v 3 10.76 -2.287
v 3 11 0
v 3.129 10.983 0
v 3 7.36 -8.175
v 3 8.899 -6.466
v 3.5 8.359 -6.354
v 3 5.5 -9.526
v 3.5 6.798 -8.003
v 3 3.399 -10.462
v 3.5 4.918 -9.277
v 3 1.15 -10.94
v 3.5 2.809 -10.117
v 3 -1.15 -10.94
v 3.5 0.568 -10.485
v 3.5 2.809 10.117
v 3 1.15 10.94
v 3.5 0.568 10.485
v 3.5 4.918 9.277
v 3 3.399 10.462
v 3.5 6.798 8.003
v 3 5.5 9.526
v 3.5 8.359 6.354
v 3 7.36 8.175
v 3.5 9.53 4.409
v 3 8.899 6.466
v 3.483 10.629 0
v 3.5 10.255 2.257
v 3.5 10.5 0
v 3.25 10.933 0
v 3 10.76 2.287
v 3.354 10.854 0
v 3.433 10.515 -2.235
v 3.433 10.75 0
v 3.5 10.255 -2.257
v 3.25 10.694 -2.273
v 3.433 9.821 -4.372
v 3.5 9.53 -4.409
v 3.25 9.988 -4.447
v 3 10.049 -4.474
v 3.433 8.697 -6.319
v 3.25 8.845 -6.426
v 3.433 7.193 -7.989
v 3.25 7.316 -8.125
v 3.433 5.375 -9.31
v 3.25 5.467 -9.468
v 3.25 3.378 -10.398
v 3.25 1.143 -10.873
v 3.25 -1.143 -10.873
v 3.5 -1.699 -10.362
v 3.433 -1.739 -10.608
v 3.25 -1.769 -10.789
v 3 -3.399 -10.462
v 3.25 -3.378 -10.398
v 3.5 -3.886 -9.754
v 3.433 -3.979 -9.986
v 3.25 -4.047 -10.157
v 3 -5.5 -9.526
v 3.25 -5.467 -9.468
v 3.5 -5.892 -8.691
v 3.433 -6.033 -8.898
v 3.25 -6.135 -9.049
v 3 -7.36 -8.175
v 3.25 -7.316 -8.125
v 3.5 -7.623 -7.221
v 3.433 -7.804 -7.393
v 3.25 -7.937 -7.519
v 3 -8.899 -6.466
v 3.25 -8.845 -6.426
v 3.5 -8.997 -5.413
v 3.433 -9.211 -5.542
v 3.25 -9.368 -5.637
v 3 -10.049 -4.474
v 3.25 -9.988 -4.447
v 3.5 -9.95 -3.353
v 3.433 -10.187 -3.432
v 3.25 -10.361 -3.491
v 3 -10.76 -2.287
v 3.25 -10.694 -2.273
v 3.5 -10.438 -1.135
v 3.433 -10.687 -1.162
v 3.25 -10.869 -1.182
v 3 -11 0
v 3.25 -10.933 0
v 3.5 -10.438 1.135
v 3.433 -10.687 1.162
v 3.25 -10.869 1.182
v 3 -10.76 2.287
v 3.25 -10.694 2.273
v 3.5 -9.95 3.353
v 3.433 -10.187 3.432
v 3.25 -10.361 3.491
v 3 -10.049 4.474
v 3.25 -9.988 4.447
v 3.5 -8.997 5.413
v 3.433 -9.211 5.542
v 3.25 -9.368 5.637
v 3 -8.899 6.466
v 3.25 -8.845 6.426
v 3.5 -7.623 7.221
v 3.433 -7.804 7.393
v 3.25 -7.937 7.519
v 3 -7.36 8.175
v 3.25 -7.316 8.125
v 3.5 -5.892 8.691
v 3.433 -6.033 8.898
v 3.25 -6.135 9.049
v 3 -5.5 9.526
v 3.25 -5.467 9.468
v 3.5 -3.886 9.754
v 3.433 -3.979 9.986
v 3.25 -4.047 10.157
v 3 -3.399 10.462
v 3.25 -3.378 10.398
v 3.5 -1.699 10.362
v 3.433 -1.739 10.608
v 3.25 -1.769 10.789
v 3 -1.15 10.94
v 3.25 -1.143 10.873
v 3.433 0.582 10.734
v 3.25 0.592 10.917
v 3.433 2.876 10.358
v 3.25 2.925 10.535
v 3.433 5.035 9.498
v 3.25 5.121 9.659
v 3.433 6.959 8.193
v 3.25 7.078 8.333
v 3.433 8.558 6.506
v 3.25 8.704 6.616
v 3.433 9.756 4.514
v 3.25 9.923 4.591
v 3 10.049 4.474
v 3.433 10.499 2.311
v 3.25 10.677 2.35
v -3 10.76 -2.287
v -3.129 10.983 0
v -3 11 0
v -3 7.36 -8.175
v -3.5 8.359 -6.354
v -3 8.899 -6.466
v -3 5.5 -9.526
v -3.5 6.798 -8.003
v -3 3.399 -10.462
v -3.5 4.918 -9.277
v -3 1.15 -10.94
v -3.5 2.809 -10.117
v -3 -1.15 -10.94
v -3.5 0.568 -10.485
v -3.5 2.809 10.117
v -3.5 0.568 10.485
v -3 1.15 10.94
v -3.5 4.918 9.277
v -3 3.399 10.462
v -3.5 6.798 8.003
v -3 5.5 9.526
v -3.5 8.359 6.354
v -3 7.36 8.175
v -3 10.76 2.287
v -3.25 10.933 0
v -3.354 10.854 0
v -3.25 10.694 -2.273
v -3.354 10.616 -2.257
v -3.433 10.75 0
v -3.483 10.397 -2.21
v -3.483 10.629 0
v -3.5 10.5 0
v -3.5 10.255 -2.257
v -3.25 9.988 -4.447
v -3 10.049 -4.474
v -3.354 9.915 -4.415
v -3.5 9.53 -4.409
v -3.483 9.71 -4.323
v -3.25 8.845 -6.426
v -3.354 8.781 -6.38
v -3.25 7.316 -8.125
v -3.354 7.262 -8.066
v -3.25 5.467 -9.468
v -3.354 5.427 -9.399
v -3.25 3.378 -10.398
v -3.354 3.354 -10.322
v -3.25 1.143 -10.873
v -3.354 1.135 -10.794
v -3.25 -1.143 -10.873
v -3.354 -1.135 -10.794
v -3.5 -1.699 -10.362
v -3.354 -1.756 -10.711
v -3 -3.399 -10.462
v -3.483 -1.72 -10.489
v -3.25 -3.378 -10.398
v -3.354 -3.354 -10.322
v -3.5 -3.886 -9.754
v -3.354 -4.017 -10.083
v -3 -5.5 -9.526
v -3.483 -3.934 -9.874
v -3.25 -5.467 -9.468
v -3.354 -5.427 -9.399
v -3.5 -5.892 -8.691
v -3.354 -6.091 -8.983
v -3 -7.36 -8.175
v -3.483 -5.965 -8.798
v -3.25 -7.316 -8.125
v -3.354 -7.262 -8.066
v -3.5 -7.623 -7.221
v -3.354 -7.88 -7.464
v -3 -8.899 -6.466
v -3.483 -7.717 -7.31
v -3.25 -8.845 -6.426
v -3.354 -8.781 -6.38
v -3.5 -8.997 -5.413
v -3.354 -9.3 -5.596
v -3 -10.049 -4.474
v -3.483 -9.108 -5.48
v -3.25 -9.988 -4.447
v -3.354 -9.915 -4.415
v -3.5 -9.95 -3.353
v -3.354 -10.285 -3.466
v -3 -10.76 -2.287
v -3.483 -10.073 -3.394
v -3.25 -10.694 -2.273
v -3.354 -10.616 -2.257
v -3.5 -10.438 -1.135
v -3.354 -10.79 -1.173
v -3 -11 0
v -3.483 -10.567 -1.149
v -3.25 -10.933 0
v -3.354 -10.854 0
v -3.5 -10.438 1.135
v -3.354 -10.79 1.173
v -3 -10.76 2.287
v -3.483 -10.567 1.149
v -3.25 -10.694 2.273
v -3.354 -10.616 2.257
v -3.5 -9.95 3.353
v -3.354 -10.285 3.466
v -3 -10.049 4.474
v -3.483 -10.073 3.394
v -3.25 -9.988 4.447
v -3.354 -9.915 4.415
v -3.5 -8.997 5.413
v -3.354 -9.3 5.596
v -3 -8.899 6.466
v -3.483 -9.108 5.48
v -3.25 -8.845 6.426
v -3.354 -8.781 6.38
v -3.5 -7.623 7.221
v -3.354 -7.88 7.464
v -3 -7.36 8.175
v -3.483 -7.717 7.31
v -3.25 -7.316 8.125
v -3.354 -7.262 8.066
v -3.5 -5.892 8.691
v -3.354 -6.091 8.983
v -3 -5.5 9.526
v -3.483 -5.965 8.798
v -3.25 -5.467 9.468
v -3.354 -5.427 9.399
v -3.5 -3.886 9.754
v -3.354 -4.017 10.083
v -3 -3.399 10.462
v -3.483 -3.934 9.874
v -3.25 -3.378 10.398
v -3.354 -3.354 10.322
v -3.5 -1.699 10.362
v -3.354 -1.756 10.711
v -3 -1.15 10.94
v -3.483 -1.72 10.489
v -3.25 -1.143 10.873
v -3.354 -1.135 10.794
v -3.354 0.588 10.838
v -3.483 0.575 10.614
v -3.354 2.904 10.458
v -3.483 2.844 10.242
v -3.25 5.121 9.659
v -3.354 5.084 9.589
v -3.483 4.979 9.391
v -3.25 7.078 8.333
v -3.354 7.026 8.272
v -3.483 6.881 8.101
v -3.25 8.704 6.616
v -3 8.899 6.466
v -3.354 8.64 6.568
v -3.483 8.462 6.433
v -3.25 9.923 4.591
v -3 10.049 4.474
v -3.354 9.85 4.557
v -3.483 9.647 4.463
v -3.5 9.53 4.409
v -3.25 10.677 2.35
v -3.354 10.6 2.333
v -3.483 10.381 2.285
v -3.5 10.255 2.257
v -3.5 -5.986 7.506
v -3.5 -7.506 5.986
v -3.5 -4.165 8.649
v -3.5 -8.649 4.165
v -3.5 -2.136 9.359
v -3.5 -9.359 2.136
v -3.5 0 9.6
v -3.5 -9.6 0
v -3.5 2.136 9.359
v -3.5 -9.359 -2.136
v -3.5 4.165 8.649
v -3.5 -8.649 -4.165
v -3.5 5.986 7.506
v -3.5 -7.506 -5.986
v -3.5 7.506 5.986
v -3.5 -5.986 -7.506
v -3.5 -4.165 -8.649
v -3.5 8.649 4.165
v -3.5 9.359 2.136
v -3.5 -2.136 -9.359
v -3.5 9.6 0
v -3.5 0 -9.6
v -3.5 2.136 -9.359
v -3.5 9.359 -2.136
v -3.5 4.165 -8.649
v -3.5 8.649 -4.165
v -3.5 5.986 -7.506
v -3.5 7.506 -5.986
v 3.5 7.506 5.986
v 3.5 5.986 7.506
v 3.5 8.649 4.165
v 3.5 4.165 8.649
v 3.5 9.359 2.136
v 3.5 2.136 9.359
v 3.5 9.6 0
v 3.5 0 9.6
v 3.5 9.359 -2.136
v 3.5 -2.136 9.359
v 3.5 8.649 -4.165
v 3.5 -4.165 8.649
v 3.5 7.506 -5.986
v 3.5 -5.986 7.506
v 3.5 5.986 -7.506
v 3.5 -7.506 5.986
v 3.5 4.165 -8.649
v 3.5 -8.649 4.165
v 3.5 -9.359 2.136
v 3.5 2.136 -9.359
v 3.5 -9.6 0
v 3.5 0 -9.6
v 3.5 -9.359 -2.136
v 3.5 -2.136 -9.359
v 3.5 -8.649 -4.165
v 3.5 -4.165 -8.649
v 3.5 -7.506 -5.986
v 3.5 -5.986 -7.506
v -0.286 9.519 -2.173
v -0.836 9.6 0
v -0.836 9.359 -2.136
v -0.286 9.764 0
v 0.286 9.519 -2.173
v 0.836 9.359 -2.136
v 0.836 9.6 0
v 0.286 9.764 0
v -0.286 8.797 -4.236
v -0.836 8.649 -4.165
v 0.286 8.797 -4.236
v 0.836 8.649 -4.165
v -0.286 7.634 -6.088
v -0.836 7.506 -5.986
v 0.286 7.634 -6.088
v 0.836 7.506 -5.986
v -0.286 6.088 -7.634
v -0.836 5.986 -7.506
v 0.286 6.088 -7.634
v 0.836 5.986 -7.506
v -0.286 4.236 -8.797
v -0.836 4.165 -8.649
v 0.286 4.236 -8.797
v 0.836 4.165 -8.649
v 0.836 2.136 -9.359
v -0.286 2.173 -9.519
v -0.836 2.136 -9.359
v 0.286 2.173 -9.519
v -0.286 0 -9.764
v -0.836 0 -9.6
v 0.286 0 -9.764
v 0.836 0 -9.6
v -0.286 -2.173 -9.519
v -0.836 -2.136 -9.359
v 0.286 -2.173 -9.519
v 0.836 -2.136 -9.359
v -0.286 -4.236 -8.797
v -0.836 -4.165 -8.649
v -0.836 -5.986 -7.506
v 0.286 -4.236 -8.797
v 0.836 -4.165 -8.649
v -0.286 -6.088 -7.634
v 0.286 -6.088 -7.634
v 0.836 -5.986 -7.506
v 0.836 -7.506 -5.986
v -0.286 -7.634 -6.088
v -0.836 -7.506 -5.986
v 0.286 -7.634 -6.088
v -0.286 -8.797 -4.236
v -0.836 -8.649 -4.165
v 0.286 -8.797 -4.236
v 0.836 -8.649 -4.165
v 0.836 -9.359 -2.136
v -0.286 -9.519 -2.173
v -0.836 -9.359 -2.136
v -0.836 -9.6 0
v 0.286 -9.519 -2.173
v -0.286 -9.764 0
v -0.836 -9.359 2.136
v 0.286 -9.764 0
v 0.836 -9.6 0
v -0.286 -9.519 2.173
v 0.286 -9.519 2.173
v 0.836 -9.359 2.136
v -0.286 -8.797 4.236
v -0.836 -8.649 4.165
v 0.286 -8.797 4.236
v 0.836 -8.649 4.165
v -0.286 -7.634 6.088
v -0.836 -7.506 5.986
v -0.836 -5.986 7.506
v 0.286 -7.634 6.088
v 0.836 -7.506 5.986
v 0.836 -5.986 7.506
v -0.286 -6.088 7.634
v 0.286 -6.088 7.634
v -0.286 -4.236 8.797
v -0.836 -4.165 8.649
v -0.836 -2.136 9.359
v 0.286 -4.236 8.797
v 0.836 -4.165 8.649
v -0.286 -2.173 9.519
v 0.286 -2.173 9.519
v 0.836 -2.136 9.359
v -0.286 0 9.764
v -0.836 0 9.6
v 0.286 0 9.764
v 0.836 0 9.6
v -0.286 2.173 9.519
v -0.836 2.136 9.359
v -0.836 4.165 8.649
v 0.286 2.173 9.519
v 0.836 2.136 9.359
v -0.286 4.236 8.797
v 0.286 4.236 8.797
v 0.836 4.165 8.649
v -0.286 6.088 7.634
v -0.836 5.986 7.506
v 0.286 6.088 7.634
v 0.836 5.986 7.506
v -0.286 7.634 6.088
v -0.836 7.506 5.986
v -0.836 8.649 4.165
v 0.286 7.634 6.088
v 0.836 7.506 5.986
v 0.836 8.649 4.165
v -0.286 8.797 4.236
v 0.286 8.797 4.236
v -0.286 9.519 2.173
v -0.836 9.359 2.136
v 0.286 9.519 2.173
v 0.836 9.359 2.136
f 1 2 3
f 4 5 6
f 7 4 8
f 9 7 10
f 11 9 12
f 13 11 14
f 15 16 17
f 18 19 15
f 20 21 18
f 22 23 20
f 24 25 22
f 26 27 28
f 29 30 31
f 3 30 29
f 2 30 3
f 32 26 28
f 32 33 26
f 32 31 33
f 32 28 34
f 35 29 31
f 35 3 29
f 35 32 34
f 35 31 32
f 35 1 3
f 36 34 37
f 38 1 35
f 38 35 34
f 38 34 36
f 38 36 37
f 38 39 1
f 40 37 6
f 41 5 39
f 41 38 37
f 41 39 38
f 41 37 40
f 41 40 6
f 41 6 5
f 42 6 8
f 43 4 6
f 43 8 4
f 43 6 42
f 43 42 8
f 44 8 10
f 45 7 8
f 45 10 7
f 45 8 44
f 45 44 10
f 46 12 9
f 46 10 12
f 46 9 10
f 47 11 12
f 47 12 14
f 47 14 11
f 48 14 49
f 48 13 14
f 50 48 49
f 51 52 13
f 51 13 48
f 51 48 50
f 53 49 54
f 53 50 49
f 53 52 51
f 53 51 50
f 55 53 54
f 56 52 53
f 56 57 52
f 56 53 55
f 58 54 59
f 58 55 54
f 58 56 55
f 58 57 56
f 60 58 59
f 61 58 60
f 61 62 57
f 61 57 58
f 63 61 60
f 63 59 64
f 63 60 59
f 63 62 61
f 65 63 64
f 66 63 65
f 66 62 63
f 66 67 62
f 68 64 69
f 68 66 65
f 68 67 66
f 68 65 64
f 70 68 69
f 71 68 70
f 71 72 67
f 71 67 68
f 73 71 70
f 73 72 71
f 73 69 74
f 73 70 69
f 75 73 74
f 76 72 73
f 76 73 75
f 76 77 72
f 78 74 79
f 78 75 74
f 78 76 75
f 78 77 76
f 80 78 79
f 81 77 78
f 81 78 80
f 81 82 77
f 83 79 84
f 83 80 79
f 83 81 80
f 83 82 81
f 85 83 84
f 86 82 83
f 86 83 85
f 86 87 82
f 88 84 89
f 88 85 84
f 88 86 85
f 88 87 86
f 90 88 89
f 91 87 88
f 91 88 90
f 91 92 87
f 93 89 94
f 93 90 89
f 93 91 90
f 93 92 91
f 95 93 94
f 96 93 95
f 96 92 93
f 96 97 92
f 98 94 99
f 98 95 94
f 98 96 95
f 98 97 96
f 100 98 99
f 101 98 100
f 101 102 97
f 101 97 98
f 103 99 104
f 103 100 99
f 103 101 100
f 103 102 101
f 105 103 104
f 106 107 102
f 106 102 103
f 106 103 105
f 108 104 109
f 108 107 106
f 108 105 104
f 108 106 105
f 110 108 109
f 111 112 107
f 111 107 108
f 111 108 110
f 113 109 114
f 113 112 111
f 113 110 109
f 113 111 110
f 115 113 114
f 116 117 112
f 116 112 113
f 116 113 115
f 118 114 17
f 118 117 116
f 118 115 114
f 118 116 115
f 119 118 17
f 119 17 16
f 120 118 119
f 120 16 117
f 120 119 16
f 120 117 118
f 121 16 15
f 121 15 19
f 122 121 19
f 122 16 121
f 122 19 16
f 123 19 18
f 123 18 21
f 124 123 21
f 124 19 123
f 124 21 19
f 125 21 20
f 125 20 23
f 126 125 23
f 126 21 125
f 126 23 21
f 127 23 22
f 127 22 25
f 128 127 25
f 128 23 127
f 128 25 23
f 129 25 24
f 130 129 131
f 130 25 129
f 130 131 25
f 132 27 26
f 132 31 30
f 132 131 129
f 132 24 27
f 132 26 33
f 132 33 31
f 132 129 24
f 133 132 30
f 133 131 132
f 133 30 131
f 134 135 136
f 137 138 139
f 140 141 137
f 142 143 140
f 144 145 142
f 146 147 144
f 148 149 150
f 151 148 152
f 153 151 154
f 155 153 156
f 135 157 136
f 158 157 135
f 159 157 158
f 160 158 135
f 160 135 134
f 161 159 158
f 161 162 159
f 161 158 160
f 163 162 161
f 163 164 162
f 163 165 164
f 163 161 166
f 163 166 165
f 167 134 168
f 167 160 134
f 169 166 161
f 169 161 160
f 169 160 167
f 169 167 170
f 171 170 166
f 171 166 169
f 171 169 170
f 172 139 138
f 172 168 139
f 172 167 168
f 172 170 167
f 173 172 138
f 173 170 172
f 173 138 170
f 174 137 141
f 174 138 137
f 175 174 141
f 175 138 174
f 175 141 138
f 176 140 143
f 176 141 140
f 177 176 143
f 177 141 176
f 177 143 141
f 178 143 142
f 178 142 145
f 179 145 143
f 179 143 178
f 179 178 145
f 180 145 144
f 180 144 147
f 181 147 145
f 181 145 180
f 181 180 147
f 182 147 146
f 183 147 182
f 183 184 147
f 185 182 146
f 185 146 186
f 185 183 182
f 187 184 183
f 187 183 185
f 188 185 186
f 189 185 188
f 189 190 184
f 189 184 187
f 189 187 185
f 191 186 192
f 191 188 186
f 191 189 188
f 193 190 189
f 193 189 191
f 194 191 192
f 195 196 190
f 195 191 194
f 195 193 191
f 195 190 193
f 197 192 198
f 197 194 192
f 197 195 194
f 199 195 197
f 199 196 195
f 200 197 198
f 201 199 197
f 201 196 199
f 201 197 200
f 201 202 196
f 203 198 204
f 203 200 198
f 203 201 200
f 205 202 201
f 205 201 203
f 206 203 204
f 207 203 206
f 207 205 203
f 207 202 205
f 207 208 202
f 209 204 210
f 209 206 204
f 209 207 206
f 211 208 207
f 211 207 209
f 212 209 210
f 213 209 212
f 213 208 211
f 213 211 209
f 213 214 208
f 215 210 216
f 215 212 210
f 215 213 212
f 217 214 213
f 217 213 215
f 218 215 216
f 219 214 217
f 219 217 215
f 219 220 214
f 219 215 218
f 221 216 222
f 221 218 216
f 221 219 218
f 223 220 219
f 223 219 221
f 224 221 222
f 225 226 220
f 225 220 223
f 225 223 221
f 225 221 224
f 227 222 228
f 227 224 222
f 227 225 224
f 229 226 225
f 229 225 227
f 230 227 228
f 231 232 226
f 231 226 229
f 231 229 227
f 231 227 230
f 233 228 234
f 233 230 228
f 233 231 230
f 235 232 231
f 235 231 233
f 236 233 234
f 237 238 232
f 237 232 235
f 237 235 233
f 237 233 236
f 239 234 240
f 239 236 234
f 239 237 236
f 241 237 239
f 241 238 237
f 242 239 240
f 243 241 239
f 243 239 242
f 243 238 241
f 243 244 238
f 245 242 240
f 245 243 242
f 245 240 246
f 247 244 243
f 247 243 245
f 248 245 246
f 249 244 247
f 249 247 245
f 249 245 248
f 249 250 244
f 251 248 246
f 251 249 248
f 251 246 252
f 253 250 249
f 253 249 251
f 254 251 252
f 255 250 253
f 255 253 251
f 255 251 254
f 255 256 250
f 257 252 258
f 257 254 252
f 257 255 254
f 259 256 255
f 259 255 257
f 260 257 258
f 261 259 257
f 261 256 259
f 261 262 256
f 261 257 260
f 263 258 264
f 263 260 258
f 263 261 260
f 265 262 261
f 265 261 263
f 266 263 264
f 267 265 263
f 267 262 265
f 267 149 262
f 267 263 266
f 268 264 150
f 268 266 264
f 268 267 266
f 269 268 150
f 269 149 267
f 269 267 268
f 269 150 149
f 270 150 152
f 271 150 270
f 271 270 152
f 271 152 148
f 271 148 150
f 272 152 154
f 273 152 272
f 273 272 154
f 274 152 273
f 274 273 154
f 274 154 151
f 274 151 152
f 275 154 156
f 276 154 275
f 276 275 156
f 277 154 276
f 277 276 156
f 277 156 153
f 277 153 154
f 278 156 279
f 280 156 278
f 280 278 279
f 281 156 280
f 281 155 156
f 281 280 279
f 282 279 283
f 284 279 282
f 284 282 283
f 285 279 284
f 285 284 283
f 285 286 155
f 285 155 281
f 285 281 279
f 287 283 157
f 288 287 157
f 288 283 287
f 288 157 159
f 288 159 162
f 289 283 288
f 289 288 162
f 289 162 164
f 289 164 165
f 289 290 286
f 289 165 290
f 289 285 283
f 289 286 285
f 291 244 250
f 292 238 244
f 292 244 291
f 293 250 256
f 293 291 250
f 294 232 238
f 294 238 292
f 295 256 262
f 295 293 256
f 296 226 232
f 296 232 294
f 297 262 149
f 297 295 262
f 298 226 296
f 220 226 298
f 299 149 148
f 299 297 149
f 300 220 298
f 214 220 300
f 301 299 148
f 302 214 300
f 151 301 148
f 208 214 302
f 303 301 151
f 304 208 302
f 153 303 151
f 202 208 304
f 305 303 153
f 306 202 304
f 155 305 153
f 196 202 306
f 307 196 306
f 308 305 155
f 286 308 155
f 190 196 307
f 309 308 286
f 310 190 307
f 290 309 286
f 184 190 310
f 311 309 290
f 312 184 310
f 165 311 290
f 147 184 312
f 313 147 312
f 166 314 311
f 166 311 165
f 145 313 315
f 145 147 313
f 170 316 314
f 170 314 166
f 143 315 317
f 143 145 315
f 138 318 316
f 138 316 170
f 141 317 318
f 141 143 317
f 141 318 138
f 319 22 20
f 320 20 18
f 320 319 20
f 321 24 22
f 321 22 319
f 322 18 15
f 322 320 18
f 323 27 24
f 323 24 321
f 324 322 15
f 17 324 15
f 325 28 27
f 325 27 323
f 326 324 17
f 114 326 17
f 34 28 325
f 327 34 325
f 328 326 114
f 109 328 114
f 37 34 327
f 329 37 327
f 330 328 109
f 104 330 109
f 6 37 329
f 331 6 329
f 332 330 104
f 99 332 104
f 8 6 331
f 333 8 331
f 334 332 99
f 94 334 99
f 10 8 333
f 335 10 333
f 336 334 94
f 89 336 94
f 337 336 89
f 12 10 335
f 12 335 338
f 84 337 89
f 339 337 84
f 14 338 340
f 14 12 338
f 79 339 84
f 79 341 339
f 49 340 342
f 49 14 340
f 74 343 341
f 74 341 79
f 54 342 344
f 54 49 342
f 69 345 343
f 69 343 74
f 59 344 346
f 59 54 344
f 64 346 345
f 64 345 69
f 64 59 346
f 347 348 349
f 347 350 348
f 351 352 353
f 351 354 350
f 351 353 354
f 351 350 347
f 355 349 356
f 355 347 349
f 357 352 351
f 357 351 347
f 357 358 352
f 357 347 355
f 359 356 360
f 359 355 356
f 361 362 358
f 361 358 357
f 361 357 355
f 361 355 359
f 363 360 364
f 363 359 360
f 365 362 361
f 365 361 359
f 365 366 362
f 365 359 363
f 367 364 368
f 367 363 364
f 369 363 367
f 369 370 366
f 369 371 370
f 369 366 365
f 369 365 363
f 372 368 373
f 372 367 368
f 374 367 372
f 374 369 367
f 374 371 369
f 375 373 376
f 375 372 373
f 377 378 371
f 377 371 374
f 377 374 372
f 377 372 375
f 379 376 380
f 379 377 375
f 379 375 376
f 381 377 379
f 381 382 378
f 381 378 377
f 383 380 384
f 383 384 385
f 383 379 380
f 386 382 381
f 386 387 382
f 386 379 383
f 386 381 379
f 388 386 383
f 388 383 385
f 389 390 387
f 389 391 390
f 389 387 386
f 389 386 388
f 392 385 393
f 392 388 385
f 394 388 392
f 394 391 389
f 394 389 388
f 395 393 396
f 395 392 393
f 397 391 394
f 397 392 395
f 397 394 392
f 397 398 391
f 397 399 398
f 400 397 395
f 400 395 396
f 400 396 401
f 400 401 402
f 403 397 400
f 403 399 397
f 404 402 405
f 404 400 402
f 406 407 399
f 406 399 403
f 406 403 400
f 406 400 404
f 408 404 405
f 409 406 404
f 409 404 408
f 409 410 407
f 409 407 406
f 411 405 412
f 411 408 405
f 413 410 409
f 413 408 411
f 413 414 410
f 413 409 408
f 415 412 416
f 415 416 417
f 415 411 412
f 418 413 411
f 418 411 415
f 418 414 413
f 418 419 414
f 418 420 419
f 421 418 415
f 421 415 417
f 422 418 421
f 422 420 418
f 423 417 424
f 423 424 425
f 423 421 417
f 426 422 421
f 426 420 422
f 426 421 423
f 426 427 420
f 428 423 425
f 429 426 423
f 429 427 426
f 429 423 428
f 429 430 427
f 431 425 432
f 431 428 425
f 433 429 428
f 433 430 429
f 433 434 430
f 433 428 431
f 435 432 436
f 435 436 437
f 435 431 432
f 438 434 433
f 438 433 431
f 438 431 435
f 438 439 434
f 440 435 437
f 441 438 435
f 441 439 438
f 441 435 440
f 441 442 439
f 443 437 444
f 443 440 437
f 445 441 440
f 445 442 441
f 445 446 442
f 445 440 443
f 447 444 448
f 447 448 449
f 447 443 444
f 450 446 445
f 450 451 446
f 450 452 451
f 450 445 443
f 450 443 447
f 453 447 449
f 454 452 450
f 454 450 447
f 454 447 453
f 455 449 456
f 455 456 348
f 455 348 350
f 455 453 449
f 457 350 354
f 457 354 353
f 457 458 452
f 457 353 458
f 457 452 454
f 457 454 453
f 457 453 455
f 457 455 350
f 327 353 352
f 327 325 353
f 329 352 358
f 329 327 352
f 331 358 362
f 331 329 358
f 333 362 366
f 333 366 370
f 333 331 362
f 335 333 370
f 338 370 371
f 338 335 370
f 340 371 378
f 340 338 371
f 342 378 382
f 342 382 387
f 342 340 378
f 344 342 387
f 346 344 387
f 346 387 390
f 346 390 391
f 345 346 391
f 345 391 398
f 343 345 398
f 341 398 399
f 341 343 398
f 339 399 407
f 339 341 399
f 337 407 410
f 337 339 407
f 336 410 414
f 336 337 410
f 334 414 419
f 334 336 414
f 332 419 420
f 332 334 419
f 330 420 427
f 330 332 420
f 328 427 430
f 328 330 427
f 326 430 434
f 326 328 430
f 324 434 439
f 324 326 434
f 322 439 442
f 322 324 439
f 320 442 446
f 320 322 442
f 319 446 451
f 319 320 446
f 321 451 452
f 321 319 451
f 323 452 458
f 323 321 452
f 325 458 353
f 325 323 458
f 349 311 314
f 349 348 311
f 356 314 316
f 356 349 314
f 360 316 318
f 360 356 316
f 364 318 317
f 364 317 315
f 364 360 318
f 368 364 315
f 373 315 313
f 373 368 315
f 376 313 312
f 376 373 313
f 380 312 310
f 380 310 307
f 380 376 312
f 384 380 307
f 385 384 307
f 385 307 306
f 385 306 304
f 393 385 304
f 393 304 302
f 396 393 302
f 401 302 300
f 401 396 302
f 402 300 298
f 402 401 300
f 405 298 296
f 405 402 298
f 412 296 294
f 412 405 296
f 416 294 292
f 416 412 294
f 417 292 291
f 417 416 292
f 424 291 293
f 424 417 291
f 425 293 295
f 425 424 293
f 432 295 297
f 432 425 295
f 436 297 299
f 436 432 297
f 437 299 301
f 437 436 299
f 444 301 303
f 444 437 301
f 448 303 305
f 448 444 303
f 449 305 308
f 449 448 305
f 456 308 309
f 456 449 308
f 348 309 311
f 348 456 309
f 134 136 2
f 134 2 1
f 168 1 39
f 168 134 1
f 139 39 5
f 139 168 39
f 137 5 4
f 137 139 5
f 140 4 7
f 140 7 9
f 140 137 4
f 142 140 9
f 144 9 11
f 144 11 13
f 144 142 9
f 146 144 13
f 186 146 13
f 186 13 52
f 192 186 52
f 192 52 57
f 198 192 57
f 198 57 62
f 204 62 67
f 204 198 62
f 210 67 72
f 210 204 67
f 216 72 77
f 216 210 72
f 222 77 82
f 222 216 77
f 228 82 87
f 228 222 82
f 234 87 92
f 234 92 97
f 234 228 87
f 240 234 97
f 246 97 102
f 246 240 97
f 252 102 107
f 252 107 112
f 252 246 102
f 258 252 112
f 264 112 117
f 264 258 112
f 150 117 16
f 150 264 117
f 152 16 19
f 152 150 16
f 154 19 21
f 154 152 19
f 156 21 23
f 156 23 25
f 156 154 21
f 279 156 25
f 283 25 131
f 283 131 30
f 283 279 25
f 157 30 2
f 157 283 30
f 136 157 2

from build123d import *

# Parameters (mm, degrees)
FILLET1_R = 0.5


with BuildPart() as part:
    # Sketch2 → Revolve1 (revolve)
    with BuildSketch(Plane.XY):
        with BuildLine():
            Line((3.5, 9.6), (3.5, 11))
            Line((3.5, 11), (-3.5, 11))
            Line((-3.5, 11), (-3.5, 9.6))
            Line((-3.5, 9.6), (-0.835607713, 9.6))
            ThreePointArc((-0.835607713, 9.6), (0, 9.7845), (0.835607713, 9.6))
            Line((0.835607713, 9.6), (3.5, 9.6))
        make_face()
    revolve(axis=Axis((23.660185957, 0, 0), (-1, 0, 0)))

    # Fillet1
    fillet1_edges = [part.edges().sort_by_distance(p)[0] for p in [
        (-3.5, -11, 0),
        (3.5, -11, 0),
    ]]
    fillet(fillet1_edges, radius=FILLET1_R)


solid = part.part
